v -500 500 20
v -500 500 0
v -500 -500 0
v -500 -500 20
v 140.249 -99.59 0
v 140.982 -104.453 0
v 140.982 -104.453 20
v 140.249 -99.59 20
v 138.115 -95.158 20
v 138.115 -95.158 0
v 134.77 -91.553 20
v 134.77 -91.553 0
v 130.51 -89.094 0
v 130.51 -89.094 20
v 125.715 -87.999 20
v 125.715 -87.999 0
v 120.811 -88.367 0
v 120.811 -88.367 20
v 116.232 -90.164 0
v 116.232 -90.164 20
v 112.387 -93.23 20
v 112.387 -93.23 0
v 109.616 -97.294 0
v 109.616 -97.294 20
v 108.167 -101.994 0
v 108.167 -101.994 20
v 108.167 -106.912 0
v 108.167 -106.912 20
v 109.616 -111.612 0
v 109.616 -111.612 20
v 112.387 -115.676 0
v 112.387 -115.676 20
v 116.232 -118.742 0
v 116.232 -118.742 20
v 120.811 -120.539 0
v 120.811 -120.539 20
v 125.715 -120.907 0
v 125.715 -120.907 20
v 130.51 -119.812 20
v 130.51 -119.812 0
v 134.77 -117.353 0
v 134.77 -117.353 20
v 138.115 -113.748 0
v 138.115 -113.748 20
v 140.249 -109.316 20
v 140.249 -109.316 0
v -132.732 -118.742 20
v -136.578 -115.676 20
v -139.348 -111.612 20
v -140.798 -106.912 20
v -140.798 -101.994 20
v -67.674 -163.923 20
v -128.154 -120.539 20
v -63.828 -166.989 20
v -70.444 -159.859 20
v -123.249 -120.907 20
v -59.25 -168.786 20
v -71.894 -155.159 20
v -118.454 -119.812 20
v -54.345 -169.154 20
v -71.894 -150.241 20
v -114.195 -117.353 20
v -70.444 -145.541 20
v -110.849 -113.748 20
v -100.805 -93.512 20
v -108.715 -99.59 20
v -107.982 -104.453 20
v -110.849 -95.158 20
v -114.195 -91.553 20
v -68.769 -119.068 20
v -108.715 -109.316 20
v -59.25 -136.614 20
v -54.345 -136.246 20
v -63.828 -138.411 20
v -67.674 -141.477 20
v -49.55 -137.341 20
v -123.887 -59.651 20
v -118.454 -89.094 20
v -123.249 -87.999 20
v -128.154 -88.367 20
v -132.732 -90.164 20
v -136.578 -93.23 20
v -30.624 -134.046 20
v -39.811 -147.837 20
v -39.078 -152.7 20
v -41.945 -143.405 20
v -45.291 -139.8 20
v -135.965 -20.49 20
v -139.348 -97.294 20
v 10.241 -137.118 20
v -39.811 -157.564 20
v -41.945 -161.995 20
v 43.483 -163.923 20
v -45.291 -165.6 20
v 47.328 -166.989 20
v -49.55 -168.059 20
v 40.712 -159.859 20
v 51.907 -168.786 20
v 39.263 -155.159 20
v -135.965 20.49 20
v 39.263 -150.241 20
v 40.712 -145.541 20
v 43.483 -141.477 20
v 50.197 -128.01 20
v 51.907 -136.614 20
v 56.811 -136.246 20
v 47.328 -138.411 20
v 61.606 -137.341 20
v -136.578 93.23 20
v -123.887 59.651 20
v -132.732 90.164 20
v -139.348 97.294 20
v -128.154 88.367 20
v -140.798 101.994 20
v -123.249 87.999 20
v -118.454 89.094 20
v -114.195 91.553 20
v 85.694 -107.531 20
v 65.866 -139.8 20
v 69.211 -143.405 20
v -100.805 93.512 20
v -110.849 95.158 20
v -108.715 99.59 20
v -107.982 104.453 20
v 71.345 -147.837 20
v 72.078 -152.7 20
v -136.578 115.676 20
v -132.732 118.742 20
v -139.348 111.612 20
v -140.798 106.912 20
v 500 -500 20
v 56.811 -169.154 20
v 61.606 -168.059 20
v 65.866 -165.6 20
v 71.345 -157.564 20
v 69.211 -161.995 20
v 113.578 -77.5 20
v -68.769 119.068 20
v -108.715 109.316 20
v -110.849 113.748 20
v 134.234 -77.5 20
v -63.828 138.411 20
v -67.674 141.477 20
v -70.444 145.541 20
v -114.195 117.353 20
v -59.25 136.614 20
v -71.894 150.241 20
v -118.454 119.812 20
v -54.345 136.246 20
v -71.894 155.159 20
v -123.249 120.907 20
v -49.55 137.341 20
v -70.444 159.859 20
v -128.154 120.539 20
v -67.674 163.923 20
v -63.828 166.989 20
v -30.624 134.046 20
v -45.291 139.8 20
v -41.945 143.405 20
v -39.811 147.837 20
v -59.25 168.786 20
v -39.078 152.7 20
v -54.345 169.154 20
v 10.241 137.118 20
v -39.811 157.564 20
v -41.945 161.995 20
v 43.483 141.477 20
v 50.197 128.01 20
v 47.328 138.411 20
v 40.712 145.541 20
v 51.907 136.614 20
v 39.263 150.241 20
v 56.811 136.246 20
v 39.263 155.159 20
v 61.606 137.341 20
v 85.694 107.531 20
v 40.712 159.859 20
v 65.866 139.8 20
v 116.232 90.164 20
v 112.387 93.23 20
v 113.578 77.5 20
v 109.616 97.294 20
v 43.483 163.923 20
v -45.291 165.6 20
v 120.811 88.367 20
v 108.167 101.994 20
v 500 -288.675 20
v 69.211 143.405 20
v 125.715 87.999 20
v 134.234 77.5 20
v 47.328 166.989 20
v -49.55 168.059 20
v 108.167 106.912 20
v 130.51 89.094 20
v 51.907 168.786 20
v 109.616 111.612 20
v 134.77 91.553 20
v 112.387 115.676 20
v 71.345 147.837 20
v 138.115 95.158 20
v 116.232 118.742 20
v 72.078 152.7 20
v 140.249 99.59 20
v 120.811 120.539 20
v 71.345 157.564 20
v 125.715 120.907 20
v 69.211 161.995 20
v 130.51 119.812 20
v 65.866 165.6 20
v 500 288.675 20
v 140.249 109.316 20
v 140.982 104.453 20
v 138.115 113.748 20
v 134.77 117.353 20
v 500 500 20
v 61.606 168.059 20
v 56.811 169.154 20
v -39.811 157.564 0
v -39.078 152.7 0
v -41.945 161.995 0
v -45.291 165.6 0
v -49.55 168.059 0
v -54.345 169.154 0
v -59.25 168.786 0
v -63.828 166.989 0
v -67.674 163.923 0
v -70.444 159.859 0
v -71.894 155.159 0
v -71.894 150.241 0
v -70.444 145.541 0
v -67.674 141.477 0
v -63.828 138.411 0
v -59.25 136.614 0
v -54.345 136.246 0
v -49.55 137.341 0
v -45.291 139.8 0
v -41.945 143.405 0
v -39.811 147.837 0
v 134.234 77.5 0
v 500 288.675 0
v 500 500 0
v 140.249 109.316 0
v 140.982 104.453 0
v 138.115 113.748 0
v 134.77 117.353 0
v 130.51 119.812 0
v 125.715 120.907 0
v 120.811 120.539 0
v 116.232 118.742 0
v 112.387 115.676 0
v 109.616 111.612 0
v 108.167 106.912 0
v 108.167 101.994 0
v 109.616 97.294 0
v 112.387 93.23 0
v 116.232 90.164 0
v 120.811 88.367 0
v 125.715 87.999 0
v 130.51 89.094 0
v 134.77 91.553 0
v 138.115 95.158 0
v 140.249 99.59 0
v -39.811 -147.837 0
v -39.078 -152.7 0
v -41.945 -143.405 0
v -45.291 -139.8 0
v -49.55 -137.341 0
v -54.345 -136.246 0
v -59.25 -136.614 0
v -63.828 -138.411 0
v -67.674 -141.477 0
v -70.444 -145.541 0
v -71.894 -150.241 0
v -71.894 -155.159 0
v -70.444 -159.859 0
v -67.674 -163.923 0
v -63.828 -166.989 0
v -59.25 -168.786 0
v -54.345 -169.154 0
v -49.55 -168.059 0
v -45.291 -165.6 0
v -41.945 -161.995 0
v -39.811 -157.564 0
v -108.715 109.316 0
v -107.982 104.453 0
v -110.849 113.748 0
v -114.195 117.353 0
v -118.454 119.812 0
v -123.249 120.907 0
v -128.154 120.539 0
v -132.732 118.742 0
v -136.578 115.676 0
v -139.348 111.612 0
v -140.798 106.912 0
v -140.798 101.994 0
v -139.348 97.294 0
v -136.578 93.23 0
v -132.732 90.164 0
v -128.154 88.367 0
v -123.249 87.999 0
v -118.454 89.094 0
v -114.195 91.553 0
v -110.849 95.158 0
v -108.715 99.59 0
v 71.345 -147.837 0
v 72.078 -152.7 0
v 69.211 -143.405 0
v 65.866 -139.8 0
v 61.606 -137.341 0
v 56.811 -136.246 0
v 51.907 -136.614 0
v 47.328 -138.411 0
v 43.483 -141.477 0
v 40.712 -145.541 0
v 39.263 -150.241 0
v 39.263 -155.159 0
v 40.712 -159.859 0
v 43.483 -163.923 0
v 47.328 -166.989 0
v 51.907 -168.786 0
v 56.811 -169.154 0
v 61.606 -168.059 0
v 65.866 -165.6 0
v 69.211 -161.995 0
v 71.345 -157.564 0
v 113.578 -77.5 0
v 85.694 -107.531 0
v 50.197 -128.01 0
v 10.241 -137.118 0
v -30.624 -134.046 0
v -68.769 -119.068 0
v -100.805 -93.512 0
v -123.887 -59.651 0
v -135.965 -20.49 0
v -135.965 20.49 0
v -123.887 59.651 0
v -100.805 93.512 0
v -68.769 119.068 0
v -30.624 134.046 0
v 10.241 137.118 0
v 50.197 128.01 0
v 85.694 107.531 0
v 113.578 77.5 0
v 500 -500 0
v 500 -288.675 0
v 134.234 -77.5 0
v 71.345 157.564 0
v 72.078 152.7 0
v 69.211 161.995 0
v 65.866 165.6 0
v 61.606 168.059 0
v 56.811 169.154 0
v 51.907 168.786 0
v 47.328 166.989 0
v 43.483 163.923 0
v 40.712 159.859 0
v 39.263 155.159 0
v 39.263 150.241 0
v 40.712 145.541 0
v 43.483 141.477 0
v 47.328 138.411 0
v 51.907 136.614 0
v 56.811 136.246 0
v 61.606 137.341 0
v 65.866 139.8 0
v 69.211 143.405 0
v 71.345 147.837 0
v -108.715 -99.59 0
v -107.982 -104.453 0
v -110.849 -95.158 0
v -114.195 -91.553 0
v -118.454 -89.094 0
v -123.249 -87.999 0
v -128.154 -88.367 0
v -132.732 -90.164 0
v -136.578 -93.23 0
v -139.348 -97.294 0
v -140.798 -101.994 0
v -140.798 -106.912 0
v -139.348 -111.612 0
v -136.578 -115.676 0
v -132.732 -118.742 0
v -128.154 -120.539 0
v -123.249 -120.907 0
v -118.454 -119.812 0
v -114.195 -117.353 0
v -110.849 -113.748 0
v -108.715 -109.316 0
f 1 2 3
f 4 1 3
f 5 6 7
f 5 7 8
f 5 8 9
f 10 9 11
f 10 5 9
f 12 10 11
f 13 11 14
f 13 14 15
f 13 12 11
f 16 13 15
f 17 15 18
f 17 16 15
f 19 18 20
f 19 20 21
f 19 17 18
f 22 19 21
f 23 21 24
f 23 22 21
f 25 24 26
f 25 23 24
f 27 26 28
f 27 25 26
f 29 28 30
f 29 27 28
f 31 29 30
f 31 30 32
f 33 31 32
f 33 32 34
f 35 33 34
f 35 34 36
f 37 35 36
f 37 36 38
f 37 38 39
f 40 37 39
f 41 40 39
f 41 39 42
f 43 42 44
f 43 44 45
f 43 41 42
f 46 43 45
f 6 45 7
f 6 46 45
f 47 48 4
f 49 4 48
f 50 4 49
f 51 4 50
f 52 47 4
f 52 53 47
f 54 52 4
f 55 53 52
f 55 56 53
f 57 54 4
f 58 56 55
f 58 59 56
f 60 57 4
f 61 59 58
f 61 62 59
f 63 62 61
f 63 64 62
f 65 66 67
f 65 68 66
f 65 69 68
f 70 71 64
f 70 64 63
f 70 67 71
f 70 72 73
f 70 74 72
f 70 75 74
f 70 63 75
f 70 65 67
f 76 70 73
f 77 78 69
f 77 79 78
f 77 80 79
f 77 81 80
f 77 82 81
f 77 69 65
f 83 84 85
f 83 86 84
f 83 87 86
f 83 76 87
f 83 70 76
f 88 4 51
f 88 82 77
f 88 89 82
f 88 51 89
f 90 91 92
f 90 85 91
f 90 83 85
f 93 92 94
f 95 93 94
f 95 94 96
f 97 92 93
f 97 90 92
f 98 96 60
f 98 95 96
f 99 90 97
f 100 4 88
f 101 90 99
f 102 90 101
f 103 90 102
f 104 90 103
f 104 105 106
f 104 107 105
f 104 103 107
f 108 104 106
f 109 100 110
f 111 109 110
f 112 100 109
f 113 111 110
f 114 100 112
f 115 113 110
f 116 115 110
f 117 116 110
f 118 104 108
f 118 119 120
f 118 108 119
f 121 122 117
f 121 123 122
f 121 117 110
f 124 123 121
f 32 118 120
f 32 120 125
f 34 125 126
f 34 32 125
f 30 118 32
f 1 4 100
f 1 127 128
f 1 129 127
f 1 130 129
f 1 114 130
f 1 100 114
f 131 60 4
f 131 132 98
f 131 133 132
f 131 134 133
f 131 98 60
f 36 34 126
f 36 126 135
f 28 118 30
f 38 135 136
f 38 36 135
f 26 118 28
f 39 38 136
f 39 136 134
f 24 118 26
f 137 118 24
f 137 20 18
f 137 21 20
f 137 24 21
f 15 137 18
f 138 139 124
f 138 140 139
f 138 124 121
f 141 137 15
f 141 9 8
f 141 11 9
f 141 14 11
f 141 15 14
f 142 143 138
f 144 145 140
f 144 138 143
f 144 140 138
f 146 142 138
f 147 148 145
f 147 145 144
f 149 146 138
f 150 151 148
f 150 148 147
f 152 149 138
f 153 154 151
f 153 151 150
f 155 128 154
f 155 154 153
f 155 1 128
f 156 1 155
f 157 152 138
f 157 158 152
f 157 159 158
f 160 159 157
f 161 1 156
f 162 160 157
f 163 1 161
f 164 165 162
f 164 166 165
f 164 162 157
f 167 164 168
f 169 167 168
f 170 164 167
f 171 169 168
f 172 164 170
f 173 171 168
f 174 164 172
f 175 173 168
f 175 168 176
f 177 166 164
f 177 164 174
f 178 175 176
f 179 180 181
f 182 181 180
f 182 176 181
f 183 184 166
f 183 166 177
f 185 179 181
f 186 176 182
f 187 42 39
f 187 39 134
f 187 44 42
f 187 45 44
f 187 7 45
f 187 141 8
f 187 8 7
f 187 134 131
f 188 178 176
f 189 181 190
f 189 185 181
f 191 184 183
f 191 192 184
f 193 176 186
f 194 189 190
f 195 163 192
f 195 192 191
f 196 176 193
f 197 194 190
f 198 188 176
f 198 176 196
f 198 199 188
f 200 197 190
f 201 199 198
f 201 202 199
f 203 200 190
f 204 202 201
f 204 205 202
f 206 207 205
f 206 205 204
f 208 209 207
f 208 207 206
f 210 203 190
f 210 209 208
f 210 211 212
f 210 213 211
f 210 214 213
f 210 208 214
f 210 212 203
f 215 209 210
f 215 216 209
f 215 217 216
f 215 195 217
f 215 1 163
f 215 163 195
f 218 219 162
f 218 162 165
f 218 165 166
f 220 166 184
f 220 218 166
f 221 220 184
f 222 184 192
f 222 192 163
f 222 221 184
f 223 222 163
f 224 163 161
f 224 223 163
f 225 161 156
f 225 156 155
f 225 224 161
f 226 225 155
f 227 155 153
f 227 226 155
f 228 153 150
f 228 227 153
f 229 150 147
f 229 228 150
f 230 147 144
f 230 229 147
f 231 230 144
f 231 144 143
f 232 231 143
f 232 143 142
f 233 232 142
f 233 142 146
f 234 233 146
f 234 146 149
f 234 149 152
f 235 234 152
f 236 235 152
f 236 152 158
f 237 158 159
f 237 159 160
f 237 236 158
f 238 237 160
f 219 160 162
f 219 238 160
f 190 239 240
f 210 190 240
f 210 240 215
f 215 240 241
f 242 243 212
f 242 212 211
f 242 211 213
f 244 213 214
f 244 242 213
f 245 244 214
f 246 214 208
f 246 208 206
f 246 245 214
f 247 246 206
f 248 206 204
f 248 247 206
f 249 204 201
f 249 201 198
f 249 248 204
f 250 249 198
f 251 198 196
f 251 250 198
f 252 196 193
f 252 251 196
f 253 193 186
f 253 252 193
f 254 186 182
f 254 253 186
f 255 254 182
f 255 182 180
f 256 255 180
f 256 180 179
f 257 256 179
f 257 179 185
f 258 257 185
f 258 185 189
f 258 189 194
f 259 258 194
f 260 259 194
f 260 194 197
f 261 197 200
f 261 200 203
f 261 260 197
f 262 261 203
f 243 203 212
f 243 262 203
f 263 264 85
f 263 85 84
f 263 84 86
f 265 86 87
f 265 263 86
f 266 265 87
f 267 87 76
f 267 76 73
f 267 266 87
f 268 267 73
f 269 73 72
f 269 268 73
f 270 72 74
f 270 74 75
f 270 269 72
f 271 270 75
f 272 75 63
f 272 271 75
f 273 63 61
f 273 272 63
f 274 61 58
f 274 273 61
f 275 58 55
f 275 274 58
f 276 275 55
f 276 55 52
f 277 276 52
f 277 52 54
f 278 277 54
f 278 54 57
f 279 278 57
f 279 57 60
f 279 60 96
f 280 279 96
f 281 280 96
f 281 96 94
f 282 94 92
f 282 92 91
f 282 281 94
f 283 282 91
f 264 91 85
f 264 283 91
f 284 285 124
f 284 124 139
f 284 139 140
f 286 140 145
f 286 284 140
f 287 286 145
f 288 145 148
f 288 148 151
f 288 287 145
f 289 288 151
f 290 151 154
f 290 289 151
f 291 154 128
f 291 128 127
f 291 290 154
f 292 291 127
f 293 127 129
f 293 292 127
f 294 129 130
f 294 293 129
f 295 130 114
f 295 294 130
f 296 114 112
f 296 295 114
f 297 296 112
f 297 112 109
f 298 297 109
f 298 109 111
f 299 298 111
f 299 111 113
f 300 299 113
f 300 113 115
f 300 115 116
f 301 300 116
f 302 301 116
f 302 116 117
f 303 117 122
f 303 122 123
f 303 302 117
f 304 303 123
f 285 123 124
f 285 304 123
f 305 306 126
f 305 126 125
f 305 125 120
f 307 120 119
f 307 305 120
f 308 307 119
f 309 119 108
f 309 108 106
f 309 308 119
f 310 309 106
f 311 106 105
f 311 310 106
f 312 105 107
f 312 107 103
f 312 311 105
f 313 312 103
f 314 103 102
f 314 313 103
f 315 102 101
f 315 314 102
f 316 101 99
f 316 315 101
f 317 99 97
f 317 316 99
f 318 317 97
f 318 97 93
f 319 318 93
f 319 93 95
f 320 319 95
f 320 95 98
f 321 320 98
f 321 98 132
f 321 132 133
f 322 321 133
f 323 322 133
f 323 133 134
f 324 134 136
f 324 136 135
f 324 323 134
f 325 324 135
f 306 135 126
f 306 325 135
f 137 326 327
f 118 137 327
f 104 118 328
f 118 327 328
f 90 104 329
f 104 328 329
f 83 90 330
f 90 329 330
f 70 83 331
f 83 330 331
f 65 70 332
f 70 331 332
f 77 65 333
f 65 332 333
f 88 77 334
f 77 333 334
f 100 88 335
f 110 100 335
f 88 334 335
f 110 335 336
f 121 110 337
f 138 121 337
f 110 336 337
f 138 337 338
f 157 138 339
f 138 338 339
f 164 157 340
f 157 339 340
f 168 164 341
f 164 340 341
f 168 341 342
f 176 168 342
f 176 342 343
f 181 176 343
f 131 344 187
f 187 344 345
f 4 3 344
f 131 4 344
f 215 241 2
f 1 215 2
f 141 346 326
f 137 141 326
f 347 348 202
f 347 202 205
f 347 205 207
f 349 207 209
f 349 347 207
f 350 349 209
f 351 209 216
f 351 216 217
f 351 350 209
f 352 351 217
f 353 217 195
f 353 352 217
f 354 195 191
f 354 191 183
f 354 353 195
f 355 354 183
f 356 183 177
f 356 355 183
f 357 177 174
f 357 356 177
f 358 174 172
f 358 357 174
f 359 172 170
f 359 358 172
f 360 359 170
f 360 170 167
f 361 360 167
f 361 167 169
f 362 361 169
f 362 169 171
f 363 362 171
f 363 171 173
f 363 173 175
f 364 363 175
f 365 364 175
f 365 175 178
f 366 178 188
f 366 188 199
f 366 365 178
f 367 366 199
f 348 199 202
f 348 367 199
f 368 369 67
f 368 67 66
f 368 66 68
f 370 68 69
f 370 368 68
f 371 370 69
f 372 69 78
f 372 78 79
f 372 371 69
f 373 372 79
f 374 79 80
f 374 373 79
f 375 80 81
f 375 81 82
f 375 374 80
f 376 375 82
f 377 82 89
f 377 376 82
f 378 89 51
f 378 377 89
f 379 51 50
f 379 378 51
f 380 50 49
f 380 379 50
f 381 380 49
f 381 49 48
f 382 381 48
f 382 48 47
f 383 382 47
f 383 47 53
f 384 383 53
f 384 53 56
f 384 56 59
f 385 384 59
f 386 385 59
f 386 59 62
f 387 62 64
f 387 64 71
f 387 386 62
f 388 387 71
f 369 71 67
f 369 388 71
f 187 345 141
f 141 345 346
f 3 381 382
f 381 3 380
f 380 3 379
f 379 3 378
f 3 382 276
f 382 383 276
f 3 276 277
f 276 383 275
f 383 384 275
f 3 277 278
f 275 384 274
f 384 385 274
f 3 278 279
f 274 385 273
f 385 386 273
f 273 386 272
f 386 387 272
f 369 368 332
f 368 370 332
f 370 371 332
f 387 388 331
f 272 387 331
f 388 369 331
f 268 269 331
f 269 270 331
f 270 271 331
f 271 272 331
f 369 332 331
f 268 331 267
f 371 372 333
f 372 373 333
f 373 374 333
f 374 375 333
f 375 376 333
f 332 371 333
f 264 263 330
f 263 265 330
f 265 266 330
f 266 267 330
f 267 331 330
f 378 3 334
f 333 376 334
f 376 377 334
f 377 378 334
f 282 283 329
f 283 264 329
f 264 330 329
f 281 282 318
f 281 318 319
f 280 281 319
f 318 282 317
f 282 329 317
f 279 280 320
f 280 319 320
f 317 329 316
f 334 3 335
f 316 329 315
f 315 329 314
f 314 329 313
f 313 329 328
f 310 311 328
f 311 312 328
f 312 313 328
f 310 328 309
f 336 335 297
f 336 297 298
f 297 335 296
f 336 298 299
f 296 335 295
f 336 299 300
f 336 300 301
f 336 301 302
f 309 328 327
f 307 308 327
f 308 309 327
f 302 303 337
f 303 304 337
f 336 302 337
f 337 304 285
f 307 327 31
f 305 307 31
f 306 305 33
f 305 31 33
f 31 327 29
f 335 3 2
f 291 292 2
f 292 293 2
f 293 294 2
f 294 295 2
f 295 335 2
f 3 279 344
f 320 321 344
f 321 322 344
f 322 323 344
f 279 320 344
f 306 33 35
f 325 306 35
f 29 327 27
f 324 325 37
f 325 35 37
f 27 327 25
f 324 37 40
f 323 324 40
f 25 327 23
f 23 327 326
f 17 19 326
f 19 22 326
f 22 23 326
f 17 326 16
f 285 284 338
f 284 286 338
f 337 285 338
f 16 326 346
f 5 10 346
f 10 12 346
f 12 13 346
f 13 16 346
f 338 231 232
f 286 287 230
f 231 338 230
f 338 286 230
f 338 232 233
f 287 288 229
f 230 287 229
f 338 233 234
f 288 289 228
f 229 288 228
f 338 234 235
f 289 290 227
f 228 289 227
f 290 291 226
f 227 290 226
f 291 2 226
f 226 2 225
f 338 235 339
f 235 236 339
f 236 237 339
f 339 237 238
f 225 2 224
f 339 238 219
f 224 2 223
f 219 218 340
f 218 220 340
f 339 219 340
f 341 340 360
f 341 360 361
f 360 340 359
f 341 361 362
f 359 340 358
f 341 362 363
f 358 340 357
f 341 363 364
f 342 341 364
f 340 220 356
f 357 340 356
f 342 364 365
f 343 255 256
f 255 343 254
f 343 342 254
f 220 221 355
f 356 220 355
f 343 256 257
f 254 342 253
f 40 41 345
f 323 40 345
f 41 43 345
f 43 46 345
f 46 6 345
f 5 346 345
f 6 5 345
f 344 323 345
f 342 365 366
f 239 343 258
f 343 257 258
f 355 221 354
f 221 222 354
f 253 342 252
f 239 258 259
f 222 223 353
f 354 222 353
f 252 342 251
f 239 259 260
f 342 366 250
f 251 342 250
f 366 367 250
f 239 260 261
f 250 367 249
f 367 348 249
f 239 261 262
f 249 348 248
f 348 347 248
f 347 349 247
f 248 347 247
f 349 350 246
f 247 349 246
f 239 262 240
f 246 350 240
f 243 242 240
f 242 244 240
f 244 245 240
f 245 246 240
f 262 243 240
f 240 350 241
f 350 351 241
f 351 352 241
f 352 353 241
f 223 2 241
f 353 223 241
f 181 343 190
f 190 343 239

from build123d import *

# Parameters (mm, degrees)
F0_R     = 16.5
F1_DEPTH = 20


with BuildPart() as f1:
    # F0 (on Top) → F1 (new body)
    with BuildSketch(Plane.XY):
        with BuildLine():
            ThreePointArc((113.578167, -77.5), (-137.5, 0), (113.578167, 77.5))
            Line((113.578167, 77.5), (134.233938, 77.5))
            Line((134.233938, 77.5), (500, 288.675135))
            Line((500, 288.675135), (500, 500))
            Line((500, 500), (-500, 500))
            Line((-500, 500), (-500, -500))
            Line((-500, -500), (500, -500))
            Line((500, -500), (500, -288.675135))
            Line((500, -288.675135), (134.233938, -77.5))
            Line((134.233938, -77.5), (113.578167, -77.5))
        make_face()
        with Locations((-55.578273, -152.700051)):
            Circle(F0_R, mode=Mode.SUBTRACT)
        with Locations((-124.482222, -104.452987)):
            Circle(F0_R, mode=Mode.SUBTRACT)
        with Locations((55.578273, -152.700051)):
            Circle(F0_R, mode=Mode.SUBTRACT)
        with Locations((124.482222, -104.452987)):
            Circle(F0_R, mode=Mode.SUBTRACT)
        with Locations((-124.482222, 104.452987)):
            Circle(F0_R, mode=Mode.SUBTRACT)
        with Locations((-55.578273, 152.700051)):
            Circle(F0_R, mode=Mode.SUBTRACT)
        with Locations((124.482222, 104.452987)):
            Circle(F0_R, mode=Mode.SUBTRACT)
        with Locations((55.578273, 152.700051)):
            Circle(F0_R, mode=Mode.SUBTRACT)
    extrude(amount=F1_DEPTH)


solid = f1.part
